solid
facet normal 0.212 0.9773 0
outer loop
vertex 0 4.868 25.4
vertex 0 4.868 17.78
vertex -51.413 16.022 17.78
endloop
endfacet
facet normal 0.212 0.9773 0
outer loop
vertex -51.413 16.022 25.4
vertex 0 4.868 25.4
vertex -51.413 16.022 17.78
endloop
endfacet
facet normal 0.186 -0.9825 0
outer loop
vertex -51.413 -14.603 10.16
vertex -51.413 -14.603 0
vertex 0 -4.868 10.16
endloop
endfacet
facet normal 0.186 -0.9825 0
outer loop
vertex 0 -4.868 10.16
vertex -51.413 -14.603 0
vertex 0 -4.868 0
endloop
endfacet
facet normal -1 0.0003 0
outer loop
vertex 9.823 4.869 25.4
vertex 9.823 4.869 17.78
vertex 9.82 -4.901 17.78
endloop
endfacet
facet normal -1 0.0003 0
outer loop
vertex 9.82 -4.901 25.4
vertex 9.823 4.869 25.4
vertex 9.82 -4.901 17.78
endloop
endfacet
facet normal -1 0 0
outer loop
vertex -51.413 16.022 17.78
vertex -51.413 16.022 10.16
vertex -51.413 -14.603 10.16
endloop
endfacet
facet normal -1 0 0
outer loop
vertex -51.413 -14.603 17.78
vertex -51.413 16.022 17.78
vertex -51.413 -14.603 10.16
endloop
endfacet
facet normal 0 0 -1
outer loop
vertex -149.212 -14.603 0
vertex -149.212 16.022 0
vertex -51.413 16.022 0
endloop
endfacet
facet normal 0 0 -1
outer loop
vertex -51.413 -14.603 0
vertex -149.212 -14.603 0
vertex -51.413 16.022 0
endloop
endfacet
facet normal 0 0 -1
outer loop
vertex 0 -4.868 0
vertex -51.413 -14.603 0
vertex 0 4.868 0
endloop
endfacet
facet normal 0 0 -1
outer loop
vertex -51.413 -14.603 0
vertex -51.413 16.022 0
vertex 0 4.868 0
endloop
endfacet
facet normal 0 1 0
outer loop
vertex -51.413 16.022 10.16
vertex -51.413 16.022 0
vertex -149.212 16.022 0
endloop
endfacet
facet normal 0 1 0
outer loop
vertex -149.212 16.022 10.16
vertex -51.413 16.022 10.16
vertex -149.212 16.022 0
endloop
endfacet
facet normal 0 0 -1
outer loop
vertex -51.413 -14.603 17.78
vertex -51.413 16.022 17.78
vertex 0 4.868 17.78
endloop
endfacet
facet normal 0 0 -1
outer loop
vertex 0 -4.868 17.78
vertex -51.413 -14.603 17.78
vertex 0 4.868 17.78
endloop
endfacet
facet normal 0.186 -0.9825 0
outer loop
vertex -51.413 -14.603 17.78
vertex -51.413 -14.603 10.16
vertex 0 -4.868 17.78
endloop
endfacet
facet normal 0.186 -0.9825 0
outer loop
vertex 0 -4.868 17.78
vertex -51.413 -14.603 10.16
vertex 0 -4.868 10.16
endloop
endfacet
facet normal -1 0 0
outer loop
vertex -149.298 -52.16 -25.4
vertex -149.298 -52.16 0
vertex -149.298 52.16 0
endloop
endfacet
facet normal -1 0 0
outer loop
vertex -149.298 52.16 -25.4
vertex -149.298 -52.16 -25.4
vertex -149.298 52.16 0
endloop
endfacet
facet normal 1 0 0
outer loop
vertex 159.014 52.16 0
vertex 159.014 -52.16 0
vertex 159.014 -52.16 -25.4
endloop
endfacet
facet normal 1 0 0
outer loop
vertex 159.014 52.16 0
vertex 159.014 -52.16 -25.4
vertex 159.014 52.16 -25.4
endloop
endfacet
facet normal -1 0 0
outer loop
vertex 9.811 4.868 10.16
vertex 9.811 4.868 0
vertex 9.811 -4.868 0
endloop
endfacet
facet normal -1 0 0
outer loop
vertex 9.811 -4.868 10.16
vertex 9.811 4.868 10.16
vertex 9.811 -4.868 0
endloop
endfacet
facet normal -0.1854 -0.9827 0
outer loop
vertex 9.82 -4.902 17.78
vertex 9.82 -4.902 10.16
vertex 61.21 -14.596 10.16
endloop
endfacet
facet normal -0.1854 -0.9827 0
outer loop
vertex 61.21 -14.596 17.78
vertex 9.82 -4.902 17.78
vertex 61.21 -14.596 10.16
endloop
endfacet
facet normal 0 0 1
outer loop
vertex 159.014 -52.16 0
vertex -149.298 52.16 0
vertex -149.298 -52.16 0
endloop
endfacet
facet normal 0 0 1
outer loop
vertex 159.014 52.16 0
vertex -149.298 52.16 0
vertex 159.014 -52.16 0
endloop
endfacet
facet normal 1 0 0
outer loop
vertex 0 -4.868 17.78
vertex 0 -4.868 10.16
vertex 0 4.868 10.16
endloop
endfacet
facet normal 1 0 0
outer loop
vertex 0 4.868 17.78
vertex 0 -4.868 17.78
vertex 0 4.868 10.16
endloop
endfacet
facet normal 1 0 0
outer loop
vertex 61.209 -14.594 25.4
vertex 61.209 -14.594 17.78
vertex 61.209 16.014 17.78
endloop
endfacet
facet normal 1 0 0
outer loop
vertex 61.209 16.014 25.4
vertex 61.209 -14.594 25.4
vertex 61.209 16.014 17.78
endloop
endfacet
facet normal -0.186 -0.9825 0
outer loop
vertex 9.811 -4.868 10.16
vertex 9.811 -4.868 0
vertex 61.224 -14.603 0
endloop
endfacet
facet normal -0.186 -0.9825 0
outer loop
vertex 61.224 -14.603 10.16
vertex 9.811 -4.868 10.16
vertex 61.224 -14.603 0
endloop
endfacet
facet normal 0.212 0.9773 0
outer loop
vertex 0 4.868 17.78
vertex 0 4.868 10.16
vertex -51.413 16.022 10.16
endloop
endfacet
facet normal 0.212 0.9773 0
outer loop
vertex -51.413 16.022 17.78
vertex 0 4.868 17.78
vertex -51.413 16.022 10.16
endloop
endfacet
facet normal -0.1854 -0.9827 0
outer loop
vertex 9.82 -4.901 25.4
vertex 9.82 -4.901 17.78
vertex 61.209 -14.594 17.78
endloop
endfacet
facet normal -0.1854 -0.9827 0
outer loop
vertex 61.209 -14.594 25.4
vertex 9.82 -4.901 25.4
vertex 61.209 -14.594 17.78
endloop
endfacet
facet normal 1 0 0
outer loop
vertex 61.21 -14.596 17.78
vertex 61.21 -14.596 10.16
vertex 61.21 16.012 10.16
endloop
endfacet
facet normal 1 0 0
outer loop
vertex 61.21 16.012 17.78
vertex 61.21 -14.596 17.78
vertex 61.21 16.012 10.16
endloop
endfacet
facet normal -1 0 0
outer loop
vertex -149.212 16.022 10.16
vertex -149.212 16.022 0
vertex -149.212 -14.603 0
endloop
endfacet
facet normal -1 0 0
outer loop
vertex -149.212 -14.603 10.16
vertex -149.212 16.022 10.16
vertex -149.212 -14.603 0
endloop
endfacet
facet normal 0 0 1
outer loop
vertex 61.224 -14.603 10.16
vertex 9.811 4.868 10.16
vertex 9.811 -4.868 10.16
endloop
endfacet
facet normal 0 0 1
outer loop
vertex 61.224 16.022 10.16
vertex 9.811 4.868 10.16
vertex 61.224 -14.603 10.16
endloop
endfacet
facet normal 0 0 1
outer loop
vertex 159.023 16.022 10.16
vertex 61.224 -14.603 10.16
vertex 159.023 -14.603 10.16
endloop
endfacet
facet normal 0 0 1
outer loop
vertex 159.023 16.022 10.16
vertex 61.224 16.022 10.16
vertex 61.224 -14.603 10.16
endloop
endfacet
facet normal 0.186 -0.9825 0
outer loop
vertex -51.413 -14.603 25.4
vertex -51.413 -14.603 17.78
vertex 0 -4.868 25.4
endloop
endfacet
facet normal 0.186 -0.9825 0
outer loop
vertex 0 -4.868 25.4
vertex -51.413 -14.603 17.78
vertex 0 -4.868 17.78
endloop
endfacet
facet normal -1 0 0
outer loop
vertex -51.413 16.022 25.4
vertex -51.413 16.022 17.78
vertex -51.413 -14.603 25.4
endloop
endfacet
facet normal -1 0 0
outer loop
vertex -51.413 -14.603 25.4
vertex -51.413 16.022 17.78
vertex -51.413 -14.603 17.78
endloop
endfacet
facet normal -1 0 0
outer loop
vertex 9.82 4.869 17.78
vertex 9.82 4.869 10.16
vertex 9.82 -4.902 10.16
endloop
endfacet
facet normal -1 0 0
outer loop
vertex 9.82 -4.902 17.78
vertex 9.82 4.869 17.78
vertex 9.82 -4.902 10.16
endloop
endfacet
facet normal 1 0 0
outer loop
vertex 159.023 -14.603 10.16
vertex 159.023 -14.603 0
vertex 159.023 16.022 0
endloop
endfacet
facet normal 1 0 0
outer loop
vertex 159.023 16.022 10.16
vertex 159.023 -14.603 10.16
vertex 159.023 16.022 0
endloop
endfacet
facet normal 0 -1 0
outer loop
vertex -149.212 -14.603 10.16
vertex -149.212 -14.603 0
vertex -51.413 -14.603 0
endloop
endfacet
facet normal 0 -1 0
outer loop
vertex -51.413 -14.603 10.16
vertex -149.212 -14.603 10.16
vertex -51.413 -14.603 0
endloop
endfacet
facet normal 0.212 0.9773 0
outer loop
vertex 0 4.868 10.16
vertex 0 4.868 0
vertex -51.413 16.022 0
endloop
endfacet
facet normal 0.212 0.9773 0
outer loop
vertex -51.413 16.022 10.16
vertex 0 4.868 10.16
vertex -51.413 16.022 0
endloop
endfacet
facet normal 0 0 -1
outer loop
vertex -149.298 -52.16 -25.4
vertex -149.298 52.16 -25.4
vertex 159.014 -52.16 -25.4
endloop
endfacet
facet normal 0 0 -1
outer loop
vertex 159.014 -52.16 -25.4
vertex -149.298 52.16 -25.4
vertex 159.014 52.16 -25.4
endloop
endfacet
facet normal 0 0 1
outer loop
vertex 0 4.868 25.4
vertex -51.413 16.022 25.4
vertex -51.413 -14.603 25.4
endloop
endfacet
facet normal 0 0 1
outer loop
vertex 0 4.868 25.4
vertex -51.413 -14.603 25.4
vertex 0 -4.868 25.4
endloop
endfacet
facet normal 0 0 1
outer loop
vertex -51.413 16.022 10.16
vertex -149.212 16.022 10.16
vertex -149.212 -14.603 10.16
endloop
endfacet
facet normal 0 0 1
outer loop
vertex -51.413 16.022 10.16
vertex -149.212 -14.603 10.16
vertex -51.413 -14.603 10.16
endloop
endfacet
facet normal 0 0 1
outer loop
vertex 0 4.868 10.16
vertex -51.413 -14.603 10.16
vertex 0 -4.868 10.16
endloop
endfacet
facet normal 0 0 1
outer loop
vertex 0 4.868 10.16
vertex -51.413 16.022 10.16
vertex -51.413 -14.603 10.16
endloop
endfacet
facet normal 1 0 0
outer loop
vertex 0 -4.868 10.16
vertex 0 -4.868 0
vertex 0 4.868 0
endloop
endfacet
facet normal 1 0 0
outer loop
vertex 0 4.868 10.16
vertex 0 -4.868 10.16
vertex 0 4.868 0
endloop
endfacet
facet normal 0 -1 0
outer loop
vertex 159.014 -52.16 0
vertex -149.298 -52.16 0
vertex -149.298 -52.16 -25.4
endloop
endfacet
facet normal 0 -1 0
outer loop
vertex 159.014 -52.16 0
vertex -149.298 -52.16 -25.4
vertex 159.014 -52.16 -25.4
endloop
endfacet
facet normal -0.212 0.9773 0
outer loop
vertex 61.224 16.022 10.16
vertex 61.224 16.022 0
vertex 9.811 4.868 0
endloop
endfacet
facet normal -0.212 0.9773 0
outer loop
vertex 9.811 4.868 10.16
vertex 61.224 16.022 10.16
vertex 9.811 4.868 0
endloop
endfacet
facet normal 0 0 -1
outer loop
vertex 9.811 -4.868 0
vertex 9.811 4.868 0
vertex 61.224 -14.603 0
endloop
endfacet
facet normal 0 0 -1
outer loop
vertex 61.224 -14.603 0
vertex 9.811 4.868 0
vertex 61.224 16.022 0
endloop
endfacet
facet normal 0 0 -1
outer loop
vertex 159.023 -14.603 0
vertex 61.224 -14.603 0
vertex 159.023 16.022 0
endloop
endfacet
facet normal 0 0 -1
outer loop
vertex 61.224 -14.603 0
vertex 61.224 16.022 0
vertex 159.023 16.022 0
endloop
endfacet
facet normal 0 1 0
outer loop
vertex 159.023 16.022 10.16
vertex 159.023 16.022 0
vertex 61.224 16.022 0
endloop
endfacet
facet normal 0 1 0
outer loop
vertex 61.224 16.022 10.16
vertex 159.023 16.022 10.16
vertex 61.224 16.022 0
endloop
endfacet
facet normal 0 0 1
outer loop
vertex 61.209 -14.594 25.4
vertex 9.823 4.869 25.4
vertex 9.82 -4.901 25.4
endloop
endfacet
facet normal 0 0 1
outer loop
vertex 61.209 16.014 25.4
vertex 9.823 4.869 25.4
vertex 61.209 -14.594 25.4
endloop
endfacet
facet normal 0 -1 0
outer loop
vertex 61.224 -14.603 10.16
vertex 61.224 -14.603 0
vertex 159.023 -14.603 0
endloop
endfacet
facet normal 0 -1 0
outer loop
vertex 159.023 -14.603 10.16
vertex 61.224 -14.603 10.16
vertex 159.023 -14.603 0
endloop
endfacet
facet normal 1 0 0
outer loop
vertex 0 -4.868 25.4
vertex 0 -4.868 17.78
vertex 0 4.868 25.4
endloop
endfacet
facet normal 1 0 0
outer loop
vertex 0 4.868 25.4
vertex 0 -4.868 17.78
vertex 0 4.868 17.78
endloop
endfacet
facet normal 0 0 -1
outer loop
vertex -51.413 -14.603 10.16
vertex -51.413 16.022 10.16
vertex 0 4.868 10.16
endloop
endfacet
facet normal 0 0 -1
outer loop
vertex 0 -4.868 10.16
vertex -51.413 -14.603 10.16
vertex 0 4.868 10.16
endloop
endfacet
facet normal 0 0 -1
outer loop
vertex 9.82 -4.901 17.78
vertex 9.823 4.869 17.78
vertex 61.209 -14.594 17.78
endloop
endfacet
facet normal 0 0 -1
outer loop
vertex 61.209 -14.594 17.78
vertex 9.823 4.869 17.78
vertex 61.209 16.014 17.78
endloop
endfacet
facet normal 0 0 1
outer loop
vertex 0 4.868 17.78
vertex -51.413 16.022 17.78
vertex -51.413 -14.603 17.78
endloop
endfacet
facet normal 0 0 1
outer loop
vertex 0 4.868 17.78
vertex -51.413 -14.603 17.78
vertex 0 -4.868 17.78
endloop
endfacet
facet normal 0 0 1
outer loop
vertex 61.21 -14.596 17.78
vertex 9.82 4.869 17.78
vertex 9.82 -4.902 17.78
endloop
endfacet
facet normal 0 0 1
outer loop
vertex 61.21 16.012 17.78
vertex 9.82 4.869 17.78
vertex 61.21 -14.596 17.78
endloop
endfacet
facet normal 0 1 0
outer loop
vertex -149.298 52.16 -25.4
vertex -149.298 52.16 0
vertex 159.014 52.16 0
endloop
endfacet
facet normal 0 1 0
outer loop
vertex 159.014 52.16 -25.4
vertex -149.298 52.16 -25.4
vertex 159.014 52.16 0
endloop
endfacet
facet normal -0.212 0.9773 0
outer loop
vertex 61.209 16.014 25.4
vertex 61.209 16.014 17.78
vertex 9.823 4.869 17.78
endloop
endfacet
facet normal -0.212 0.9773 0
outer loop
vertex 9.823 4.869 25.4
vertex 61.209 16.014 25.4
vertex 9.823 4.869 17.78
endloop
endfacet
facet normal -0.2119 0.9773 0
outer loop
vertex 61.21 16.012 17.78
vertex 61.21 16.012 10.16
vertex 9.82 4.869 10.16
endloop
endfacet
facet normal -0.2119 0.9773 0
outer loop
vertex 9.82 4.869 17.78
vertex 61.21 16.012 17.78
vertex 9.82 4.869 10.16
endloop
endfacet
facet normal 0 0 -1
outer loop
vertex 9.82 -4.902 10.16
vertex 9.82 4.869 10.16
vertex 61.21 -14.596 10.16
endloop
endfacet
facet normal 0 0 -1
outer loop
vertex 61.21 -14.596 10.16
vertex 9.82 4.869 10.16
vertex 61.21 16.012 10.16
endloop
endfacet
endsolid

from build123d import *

# Parameters (mm, degrees)
F0_W     = 308.3111420274
F0_H     = 104.3191924691
F1_DEPTH = 25.4
F3_DEPTH = 10.16
F5_DEPTH = 7.62
F7_DEPTH = 7.62


# Not quite as in the source:
# - a feature names something its author has since deleted; it is built from what else it names


with BuildPart() as f1:
    # F0 (on Top) → F1 (new body)
    with BuildSketch(Plane.XY):
        with Locations((4.8579312861, 0)):
            Rectangle(F0_W, F0_H)
    extrude(amount=-F1_DEPTH)


with BuildPart() as f3:
    # F2 (on face) → F3 (new body)
    with BuildSketch(Plane.XY):
        Polygon((0, 4.8675285652), (-51.4132715762, 16.0222817212), (-149.2118090391, 16.0222817212), (-149.2118090391, -14.602586627), (-51.4132715762, -14.602586627), (0, -4.8675285652), align=None)
    extrude(amount=F3_DEPTH)


with BuildPart() as f3b:
    # F2 (on face) → F3, piece 2 (new body)
    with BuildSketch(Plane.XY):
        Polygon((159.022857435, 16.0222817212), (61.2243199721, 16.0222817212), (9.8110483959, 4.8675285652), (9.8110483959, -4.8675285652), (61.2243199721, -14.602586627), (159.022857435, -14.602586627), align=None)
    extrude(amount=F3_DEPTH)


with BuildPart() as f5:
    # F4 (on face) → F5 (new body)
    with BuildSketch(Plane.XY.offset(10.16)):
        Polygon((0, 4.8675285652), (-51.4132715762, 16.0222817212), (-51.4132715762, -14.602586627), (0, -4.8675285652), align=None)
    extrude(amount=F5_DEPTH)


with BuildPart() as f5b:
    # F4 (on face) → F5, piece 2 (new body)
    with BuildSketch(Plane.XY.offset(10.16)):
        Polygon((61.2102486193, 16.0119906068), (9.8198475316, 4.8690438271), (9.8198475316, -4.9016783014), (61.2102486193, -14.5960105583), align=None)
    extrude(amount=F5_DEPTH)


with BuildPart() as f7:
    # F6 (on face) → F7 (new body)
    with BuildSketch(Plane.XY.offset(17.78)):
        Polygon((0, 4.8675285652), (-51.4132715762, 16.0222817212), (-51.4132715762, -14.602586627), (0, -4.8675285652), align=None)
    extrude(amount=F7_DEPTH)


with BuildPart() as f7b:
    # F6 (on face) → F7, piece 2 (new body)
    with BuildSketch(Plane.XY.offset(17.78)):
        Polygon((61.2093545496, 16.0136017948), (9.8226387054, 4.8693544231), (9.8197283223, -4.9014249817), (61.2093545496, -14.5944608375), align=None)
    extrude(amount=F7_DEPTH)


solid = Compound([f1.part, f3.part, f3b.part, f5.part, f5b.part, f7.part, f7b.part])
